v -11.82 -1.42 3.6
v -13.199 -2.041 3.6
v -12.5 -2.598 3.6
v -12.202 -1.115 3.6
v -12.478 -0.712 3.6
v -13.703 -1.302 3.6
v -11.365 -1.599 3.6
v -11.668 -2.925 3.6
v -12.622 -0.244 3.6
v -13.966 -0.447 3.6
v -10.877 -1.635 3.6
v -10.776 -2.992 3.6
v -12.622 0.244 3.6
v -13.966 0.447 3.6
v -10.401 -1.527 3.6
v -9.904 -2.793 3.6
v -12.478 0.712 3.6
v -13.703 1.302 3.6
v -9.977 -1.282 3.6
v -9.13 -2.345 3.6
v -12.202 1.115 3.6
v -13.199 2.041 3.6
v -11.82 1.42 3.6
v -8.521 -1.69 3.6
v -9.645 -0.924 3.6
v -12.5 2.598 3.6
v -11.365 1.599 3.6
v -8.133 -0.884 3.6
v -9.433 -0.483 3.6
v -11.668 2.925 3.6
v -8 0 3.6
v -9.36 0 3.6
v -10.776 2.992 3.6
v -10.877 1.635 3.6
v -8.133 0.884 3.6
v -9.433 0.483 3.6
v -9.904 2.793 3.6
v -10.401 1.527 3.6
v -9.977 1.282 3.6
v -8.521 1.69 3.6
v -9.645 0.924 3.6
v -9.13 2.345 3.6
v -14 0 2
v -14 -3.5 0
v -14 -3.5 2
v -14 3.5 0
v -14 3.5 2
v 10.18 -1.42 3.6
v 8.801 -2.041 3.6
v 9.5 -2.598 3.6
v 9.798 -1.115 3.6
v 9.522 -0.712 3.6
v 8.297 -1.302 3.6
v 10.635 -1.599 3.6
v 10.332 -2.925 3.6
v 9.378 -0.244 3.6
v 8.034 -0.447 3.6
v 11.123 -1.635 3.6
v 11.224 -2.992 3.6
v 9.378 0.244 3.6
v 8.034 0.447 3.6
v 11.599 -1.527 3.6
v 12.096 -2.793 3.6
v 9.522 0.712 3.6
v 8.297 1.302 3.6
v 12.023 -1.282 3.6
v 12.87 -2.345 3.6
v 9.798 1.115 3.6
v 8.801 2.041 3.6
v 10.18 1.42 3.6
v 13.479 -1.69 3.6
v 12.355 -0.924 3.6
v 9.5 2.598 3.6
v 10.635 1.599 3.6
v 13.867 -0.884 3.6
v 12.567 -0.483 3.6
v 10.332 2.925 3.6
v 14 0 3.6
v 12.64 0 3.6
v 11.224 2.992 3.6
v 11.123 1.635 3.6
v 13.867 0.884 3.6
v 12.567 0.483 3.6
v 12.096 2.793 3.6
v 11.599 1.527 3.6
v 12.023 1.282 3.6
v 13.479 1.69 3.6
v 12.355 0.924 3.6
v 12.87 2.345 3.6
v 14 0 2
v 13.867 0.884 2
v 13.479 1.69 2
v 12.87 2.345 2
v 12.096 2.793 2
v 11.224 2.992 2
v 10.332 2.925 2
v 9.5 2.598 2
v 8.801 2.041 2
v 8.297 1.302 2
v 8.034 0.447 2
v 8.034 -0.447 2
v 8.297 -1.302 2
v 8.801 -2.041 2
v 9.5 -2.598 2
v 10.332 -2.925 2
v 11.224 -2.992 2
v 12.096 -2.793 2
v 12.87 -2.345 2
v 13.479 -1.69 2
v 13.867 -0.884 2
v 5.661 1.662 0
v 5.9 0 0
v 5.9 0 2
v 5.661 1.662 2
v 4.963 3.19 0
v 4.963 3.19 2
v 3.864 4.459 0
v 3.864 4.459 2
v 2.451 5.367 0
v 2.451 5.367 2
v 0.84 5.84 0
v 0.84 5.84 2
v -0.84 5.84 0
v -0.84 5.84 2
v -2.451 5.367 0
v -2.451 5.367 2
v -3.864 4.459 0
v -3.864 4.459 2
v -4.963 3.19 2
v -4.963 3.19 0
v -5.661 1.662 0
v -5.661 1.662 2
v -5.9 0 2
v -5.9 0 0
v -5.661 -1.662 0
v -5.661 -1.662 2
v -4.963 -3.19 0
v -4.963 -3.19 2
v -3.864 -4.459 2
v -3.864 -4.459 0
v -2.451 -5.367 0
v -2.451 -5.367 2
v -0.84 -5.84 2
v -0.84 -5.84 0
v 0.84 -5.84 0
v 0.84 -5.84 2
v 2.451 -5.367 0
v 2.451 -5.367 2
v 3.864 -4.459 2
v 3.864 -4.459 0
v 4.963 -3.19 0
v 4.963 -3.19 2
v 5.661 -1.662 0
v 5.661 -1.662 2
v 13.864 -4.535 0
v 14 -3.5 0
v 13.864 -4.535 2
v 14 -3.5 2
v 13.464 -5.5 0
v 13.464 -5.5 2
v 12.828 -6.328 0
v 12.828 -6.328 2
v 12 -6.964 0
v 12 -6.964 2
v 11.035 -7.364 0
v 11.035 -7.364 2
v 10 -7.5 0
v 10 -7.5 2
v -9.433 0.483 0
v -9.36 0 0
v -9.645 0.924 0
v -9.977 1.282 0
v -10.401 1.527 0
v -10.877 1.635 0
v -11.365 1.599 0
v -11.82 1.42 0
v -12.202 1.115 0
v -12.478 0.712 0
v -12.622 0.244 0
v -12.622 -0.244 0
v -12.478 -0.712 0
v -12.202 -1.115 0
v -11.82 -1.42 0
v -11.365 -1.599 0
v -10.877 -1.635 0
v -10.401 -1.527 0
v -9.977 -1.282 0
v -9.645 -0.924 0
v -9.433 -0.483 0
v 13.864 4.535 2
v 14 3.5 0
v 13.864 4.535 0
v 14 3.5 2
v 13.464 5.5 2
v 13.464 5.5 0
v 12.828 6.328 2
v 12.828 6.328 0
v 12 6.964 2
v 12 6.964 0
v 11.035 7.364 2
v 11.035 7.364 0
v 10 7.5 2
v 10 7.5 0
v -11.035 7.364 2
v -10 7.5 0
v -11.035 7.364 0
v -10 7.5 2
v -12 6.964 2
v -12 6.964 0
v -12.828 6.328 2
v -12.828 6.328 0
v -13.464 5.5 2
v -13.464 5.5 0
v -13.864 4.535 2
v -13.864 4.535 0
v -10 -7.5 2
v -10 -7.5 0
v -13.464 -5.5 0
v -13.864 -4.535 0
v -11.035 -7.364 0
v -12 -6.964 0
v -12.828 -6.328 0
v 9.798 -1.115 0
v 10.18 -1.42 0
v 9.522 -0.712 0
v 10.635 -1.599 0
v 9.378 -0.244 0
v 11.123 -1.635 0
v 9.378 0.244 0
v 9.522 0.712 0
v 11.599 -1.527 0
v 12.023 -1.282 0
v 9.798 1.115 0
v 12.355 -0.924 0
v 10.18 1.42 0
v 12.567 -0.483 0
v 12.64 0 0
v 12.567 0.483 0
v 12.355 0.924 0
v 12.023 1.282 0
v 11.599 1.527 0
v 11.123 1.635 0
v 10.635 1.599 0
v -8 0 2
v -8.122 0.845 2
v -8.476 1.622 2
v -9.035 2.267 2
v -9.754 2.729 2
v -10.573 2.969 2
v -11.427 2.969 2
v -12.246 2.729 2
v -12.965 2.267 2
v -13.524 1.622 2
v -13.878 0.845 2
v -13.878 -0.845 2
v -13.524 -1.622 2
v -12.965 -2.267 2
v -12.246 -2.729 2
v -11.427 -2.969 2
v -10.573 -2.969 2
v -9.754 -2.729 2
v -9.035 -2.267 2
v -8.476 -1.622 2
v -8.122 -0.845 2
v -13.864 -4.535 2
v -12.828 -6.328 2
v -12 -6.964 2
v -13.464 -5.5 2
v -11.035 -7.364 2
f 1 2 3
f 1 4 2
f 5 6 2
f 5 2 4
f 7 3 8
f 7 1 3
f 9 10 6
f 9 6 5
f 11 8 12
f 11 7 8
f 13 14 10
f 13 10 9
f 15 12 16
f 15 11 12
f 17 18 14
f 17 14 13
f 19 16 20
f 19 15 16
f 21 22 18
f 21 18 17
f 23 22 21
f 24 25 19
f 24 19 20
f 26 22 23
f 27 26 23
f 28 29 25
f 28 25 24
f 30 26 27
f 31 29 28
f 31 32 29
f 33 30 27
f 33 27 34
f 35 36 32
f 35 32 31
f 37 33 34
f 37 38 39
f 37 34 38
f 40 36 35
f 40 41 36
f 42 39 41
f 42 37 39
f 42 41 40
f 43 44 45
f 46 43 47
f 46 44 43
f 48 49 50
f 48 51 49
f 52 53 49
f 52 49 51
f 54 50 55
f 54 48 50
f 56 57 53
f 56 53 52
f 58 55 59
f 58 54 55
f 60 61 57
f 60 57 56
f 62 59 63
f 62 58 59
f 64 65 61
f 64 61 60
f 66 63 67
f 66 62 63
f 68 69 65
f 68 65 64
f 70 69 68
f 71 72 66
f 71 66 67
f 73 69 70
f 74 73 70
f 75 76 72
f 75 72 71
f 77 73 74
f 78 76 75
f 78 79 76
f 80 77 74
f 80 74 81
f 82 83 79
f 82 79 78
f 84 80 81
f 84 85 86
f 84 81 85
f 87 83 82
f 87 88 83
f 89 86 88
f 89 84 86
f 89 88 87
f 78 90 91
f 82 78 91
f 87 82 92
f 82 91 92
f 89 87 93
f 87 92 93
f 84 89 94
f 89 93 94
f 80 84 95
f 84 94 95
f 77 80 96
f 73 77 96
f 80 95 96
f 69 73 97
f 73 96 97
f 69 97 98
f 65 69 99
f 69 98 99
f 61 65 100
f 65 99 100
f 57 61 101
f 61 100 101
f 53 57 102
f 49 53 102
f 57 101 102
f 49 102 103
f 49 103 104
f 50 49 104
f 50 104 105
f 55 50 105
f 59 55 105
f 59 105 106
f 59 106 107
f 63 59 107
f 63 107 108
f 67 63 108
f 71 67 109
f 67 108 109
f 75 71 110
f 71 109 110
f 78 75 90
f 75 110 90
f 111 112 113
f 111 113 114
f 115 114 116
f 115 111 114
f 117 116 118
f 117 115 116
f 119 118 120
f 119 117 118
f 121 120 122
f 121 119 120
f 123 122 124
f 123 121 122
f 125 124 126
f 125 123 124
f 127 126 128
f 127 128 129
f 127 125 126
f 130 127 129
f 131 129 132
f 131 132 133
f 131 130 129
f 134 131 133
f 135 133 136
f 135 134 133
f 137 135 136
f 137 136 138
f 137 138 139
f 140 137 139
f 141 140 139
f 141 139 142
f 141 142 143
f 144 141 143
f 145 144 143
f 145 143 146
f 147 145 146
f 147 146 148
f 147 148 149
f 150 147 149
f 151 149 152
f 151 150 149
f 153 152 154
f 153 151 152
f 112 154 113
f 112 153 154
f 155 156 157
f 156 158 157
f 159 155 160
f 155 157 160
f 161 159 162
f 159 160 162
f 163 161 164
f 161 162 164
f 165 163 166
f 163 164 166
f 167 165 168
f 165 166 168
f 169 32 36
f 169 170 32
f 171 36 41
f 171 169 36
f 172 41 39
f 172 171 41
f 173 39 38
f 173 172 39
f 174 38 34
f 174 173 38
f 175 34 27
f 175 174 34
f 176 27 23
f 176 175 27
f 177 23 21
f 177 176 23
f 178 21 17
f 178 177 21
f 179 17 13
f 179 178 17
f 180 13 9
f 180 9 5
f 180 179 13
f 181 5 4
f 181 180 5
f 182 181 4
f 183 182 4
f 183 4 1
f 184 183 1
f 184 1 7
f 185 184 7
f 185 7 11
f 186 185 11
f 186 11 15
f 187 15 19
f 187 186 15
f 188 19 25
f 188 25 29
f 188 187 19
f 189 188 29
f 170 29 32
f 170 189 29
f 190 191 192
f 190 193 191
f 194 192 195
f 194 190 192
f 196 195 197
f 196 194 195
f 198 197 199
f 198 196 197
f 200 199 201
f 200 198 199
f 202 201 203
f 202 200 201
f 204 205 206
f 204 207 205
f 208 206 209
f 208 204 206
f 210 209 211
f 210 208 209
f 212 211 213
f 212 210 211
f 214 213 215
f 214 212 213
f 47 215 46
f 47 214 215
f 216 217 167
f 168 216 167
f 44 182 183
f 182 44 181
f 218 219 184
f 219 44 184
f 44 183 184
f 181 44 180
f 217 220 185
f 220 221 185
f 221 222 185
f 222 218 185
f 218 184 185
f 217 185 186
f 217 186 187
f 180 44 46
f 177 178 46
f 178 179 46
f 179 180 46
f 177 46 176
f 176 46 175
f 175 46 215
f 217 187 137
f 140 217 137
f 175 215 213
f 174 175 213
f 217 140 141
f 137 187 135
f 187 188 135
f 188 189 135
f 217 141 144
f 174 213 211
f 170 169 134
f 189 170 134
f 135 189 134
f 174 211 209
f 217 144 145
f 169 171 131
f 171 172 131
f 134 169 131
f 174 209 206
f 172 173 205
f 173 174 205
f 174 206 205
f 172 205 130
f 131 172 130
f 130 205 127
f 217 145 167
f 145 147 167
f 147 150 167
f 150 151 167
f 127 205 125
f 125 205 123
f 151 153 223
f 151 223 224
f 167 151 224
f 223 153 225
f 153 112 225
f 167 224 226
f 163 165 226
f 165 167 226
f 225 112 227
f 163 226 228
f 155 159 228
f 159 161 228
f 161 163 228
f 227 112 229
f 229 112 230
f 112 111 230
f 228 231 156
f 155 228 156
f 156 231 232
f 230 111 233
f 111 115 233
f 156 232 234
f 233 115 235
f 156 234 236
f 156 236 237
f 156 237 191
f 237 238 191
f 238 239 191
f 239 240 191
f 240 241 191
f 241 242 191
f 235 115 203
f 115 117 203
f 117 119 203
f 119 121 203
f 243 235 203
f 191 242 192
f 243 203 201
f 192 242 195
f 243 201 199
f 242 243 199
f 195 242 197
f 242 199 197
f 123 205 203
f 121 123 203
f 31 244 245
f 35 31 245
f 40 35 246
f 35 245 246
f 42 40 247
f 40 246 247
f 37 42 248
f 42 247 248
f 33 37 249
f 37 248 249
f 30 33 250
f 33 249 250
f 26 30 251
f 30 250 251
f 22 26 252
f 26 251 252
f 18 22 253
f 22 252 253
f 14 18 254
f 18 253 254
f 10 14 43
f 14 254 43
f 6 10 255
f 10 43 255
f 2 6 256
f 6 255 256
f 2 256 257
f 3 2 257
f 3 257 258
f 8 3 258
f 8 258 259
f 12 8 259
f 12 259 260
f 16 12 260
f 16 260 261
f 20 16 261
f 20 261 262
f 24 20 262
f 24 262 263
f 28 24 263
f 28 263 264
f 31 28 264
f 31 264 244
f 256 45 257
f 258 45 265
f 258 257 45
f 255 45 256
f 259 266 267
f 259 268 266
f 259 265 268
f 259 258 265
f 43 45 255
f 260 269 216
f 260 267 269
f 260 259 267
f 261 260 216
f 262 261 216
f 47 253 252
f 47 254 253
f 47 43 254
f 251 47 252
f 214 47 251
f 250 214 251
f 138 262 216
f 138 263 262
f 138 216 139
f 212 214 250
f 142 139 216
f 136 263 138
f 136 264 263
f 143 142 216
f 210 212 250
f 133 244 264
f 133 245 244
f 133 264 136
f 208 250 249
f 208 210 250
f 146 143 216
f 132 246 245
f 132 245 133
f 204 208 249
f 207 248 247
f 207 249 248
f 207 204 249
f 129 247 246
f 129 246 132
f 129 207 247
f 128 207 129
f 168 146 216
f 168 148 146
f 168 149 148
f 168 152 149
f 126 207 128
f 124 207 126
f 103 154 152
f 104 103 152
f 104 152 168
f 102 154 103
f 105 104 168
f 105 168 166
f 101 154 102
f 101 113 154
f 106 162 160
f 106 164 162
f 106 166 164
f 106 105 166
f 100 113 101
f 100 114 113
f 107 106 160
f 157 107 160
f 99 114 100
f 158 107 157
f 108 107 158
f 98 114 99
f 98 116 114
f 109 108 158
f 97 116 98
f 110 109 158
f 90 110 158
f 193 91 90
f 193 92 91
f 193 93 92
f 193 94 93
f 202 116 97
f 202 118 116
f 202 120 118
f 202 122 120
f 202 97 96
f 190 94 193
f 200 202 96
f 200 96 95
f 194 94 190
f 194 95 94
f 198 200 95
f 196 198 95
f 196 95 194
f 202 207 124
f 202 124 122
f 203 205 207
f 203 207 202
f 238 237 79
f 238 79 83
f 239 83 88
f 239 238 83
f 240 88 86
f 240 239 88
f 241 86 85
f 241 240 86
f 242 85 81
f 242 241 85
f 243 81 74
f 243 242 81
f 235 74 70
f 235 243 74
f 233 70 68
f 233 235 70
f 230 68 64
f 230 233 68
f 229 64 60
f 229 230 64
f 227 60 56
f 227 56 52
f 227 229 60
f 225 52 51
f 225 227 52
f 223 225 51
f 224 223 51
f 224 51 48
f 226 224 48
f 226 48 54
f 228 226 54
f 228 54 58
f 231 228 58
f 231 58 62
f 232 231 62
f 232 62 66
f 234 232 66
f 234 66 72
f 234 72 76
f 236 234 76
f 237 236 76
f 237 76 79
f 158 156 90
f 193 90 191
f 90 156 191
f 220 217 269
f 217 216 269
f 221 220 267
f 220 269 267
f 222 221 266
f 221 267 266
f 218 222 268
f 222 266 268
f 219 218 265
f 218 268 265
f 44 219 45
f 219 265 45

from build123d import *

# Parameters (mm, degrees)
SKETCH_W      = 28
SKETCH_H      = 15
SKETCH_R      = 5.9
SKETCH_R_2    = 1.64
PAD_DEPTH     = 2
SKETCH001_R   = 3
SKETCH001_R_2 = 1.64
PAD001_DEPTH  = 1.6
FILLET_R      = 4


with BuildPart() as part:
    # Sketch → Pad (new body)
    with BuildSketch(Plane.XY):
        Rectangle(SKETCH_W, SKETCH_H)
        Circle(SKETCH_R, mode=Mode.SUBTRACT)
        with Locations((-11, 0)):
            Circle(SKETCH_R_2, mode=Mode.SUBTRACT)
        with Locations((11, 0)):
            Circle(SKETCH_R_2, mode=Mode.SUBTRACT)
    extrude(amount=PAD_DEPTH)

    # Sketch001 (on Face9 of Pad) → Pad001 (join)
    with BuildSketch(Plane.XY.offset(2)):
        with Locations((-11, 0)):
            Circle(SKETCH001_R)
        with Locations((-11, 0)):
            Circle(SKETCH001_R_2, mode=Mode.SUBTRACT)
        with Locations((11, 0)):
            Circle(SKETCH001_R)
        with Locations((11, 0)):
            Circle(SKETCH001_R_2, mode=Mode.SUBTRACT)
    extrude(amount=PAD001_DEPTH)

    # Fillet
    fillet_edges = [part.edges().sort_by_distance(p)[0] for p in [
        (14, -7.5, 1),
        (14, 7.5, 1),
        (-14, 7.5, 1),
        (-14, -7.5, 1),
    ]]
    fillet(fillet_edges, radius=FILLET_R)


solid = part.part
